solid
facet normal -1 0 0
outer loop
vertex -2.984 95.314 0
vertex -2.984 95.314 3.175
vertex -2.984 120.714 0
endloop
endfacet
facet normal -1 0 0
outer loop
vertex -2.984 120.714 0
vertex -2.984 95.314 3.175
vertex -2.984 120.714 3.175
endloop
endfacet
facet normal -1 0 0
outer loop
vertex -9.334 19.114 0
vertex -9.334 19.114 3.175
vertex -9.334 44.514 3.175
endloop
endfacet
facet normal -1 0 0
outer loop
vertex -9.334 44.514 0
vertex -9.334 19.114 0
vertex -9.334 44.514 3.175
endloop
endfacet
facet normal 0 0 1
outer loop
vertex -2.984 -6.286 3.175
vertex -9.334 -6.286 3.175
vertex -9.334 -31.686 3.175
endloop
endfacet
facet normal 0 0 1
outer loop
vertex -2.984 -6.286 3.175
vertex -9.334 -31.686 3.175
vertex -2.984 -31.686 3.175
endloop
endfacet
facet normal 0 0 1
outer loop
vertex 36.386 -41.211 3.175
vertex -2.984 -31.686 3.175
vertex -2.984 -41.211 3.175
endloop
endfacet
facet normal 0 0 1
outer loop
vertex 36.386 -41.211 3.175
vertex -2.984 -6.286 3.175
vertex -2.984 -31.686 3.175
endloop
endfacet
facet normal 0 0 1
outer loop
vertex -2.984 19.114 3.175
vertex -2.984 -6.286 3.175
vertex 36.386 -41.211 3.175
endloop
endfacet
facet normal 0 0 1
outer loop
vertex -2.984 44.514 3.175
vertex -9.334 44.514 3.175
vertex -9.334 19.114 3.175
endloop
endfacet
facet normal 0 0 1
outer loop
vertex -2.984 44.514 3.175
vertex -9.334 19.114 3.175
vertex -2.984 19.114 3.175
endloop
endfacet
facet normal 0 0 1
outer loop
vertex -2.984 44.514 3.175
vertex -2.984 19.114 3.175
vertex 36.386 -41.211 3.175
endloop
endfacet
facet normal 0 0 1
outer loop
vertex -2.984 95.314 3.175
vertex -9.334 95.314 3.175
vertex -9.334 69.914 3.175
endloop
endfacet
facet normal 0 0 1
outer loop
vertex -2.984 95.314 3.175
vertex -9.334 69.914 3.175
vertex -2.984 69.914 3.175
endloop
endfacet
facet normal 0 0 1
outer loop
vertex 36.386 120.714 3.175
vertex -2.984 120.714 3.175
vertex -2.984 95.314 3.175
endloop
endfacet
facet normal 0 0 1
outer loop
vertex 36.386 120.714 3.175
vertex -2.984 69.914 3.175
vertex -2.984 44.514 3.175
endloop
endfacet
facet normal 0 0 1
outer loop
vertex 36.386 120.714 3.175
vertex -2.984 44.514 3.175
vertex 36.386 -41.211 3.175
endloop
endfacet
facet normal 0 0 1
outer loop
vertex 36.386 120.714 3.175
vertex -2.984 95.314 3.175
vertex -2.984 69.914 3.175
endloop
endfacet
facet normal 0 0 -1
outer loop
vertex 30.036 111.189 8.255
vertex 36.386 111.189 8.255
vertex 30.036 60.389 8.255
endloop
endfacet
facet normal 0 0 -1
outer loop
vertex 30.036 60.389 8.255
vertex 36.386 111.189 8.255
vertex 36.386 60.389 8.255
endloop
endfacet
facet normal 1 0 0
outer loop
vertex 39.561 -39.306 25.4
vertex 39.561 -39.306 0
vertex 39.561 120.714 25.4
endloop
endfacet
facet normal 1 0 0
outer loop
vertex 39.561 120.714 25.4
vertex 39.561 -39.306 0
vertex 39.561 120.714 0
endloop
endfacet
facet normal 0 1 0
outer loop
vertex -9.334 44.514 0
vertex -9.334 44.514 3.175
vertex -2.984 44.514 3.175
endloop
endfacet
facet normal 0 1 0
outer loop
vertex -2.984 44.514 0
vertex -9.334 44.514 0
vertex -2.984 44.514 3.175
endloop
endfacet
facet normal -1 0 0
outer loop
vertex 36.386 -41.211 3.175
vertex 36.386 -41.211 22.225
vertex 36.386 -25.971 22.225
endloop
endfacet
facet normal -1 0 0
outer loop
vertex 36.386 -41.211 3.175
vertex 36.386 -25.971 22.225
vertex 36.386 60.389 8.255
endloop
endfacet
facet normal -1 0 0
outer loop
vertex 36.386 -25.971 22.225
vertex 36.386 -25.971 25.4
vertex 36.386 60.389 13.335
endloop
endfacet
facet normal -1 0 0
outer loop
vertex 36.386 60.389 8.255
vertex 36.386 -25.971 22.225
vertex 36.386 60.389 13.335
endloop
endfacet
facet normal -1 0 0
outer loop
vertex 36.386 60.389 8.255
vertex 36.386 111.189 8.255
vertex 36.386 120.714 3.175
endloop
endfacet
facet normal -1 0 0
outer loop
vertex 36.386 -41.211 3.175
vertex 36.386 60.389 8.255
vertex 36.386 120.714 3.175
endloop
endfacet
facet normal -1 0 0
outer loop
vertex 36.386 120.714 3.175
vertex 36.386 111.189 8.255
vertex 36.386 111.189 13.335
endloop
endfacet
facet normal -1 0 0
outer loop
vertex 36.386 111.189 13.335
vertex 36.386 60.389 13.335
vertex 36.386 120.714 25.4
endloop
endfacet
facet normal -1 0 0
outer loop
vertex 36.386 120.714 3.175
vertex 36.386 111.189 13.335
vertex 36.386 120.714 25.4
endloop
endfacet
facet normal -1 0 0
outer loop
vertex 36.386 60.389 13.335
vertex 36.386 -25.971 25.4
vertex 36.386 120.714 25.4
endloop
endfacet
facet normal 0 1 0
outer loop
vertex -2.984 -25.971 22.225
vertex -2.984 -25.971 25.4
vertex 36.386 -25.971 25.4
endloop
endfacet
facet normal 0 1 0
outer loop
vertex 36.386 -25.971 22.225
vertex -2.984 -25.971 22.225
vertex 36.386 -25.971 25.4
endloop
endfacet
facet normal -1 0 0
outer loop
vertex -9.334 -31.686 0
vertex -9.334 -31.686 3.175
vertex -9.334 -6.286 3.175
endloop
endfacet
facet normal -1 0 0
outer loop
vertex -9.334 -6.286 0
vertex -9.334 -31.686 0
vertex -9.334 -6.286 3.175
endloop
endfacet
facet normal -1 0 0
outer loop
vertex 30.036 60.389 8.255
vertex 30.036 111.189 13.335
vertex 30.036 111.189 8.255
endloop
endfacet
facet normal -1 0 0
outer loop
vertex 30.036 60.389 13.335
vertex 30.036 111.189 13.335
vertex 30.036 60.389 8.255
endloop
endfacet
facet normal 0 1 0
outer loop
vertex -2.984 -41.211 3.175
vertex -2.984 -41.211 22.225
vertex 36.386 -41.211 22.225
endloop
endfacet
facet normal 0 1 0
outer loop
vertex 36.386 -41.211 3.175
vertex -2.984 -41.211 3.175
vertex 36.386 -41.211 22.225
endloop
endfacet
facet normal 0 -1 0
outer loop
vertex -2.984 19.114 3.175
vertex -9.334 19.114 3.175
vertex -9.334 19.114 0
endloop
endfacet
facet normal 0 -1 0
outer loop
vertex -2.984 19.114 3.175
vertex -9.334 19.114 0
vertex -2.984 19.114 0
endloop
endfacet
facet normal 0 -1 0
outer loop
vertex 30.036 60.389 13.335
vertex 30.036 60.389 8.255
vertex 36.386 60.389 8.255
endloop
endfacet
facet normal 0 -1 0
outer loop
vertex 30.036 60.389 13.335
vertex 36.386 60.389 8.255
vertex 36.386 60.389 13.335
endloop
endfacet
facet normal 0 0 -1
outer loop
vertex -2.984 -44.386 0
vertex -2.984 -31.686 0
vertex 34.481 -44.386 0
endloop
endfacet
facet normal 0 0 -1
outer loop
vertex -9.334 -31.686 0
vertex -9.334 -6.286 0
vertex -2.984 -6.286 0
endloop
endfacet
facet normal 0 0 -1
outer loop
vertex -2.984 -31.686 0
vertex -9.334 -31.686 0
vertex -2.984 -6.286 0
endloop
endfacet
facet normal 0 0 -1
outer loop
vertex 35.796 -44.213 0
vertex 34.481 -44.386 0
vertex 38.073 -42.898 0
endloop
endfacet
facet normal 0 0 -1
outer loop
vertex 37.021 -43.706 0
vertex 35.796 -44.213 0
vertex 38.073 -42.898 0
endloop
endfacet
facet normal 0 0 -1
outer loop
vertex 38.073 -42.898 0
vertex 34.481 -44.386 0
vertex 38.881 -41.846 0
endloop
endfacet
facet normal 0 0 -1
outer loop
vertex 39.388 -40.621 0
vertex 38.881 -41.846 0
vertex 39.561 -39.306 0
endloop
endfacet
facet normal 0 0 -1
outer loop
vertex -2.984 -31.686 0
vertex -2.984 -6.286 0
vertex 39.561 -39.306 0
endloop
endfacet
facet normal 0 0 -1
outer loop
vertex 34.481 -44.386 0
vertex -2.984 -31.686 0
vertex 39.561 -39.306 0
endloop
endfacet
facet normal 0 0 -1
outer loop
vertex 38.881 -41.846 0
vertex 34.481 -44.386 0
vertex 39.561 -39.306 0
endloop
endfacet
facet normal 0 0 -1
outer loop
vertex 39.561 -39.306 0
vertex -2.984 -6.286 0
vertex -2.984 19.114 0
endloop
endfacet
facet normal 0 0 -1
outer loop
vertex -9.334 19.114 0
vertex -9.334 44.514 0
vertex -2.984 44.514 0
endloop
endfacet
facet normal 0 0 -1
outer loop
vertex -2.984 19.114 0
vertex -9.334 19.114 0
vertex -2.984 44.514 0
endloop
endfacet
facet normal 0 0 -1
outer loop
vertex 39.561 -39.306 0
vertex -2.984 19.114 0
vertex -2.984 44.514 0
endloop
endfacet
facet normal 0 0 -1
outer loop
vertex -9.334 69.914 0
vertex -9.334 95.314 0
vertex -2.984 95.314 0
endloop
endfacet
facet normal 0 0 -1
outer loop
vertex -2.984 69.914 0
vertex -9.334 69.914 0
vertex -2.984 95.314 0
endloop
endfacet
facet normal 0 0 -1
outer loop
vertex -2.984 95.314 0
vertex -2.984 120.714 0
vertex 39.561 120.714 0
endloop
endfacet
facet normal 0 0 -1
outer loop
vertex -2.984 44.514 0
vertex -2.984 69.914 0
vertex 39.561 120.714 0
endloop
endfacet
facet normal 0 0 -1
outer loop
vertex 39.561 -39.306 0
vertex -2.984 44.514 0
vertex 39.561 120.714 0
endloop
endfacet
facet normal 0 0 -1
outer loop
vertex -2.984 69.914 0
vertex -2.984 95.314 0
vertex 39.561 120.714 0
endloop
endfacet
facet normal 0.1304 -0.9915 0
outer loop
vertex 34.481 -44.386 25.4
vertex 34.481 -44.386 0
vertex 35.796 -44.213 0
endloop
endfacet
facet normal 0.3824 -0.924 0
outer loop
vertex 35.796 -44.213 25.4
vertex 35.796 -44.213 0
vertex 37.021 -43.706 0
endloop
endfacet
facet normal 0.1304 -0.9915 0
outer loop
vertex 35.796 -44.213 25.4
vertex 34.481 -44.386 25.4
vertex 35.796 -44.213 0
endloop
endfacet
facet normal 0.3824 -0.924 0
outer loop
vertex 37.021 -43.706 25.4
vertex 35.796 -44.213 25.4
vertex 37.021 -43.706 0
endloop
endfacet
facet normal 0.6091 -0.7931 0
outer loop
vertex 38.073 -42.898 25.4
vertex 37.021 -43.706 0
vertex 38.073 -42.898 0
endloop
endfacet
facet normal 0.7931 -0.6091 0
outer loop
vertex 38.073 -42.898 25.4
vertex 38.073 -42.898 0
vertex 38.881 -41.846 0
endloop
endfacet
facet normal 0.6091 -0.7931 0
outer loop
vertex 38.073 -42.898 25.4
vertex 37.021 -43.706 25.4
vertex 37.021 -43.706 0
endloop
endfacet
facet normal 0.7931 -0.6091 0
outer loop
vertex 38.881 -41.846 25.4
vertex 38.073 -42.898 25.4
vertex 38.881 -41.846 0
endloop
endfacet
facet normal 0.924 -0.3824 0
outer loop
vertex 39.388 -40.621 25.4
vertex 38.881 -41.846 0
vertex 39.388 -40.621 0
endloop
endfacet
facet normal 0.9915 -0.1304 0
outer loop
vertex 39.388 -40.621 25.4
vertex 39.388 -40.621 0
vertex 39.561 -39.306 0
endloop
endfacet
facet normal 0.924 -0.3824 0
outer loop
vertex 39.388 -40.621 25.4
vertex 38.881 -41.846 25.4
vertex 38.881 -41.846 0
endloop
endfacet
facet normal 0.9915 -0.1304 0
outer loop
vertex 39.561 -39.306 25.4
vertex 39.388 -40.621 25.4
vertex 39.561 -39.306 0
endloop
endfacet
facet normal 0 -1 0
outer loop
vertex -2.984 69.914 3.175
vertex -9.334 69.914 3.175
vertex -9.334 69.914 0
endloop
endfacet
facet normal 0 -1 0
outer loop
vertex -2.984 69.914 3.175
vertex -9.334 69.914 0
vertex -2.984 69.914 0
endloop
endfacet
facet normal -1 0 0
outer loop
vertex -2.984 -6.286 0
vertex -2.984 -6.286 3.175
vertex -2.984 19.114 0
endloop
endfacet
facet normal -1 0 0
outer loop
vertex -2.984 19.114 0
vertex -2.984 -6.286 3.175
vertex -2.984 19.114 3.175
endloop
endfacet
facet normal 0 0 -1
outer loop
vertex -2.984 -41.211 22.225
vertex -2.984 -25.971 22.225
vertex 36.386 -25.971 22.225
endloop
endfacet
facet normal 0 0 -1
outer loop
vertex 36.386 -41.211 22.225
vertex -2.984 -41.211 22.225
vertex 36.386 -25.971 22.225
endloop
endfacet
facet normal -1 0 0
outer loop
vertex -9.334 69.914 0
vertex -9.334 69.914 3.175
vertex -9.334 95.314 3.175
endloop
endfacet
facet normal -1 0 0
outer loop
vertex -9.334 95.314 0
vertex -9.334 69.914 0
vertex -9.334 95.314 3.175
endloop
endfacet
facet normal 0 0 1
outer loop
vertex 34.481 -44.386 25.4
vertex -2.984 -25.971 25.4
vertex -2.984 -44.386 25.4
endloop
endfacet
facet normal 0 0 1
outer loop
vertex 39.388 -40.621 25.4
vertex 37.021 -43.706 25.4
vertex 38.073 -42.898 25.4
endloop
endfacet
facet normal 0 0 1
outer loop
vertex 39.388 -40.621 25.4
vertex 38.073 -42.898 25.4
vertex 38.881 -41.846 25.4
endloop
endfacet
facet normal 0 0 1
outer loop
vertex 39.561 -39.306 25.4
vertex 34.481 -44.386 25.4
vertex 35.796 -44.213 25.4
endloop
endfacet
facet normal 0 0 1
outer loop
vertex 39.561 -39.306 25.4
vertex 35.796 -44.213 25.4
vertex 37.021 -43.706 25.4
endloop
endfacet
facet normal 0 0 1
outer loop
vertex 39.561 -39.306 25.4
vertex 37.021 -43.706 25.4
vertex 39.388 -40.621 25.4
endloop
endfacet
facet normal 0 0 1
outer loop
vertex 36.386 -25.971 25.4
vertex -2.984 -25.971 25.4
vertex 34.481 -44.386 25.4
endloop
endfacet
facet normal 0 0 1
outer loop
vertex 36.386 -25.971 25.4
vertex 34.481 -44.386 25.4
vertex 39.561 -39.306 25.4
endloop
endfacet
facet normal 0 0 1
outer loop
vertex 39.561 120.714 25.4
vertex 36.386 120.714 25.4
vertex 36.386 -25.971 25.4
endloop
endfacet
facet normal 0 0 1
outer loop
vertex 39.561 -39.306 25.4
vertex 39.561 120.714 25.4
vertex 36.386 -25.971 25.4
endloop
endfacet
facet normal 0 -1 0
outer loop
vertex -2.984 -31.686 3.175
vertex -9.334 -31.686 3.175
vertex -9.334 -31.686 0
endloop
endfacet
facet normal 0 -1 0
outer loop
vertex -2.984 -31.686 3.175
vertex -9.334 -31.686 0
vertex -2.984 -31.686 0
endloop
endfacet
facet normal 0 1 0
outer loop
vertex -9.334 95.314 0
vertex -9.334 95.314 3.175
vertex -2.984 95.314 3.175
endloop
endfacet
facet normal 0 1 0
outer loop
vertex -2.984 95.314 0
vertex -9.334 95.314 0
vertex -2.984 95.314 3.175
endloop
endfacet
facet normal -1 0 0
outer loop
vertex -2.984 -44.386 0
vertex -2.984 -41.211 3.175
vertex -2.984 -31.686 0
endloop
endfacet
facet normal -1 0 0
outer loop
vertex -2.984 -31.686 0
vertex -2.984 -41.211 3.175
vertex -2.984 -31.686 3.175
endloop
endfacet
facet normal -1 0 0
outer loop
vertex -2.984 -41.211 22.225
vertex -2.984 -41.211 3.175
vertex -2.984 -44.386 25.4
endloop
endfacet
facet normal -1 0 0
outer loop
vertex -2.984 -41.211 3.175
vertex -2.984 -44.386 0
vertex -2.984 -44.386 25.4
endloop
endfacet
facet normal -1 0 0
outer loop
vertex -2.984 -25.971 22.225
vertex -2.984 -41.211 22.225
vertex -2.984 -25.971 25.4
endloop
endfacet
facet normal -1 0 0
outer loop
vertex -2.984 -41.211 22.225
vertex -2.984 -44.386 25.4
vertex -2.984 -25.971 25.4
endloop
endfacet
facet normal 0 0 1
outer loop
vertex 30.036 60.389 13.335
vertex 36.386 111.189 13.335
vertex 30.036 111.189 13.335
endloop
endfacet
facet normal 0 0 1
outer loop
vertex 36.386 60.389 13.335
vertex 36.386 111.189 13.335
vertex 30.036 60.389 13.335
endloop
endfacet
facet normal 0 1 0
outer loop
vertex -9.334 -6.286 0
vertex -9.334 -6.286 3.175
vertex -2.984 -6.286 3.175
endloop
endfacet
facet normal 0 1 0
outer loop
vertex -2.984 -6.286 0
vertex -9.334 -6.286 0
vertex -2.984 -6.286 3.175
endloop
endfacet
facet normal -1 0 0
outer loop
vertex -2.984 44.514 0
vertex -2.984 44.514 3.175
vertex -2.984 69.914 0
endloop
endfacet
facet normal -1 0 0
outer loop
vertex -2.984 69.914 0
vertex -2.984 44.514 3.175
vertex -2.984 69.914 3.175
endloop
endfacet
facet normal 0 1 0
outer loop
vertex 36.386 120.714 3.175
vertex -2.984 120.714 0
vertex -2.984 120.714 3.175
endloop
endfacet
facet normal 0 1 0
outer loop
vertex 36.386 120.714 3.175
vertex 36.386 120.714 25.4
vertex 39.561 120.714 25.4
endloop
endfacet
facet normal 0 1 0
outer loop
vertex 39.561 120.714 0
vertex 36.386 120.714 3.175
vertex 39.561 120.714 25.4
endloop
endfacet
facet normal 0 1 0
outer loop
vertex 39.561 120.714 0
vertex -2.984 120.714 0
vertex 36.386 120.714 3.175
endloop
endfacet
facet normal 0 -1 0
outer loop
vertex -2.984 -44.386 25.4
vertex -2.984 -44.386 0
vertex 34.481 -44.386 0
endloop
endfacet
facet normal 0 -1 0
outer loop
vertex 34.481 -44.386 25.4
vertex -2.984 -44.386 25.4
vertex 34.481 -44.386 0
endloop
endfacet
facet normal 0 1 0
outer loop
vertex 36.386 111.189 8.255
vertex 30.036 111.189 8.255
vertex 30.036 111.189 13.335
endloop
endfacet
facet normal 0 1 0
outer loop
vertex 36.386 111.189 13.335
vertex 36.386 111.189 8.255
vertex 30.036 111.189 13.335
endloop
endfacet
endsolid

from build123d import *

# Parameters (mm, degrees)
F0_W      = 85.09
F0_H      = 165.1
F1_DEPTH  = 25.4
F2_W      = 39.37
F2_H      = 161.925
F3_DEPTH  = 22.225
F4_W      = 50.8
F4_H      = 5.08
F5_DEPTH  = 6.35
F7_DEPTH  = 25.401
F8_W      = 39.37
F8_H      = 15.24
F9_DEPTH  = 3.175
F10_W     = 6.35
F10_H     = 25.4
F11_DEPTH = 3.175
F12_R     = 5.08


with BuildPart() as f1:
    # F0 (on Top) → F1 (new body)
    with BuildSketch(Plane.XY):
        with Locations((-2.9836203903, 38.1636999707)):
            Rectangle(F0_W, F0_H)
    extrude(amount=F1_DEPTH)

    # F2 (on face) → F3 (cut)
    with BuildSketch(Plane.XY.offset(25.4)):
        with Locations((16.7013796097, 39.7511999707)):
            Rectangle(F2_W, F2_H)
    extrude(amount=-F3_DEPTH, mode=Mode.SUBTRACT)

    # F4 (on face) → F5 (join)
    with BuildSketch(Plane(origin=(36.3863796097, 0, 0), x_dir=(0, -1, 0), z_dir=(-1, 0, 0))):
        with Locations((-85.7886999707, 10.795)):
            Rectangle(F4_W, F4_H)
    extrude(amount=F5_DEPTH)

    # F6 (on face) → F7 (cut, through all)
    with BuildSketch(Plane.XY.offset(25.4)):
        Polygon((-2.9836203903, -41.2113000293), (-2.9836203903, 120.7136999707), (-45.5286203903, 120.7136999707), (-45.5286203903, -44.3863000293), (-2.9836203903, -44.3863000293), align=None)
    extrude(amount=-F7_DEPTH, mode=Mode.SUBTRACT)

    # F8 (on face) → F9 (join)
    with BuildSketch(Plane.XY.offset(25.4)):
        with Locations((16.7013796097, -33.5913000293)):
            Rectangle(F8_W, F8_H)
    extrude(amount=-F9_DEPTH)

    # F10 (on face) → F11 (join)
    with BuildSketch(Plane.XY.offset(3.175)):
        with Locations((-6.1586203903, 82.6136999707)):
            Rectangle(F10_W, F10_H)
        with Locations((-6.1586203903, 31.8136999707)):
            Rectangle(F10_W, F10_H)
        with Locations((-6.1586203903, -18.9863000293)):
            Rectangle(F10_W, F10_H)
    extrude(amount=-F11_DEPTH)

    # F12
    f12_edges = [f1.edges().sort_by_distance(p)[0] for p in [
        (39.56138, -44.3863, 12.7),
    ]]
    fillet(f12_edges, radius=F12_R)


solid = f1.part
